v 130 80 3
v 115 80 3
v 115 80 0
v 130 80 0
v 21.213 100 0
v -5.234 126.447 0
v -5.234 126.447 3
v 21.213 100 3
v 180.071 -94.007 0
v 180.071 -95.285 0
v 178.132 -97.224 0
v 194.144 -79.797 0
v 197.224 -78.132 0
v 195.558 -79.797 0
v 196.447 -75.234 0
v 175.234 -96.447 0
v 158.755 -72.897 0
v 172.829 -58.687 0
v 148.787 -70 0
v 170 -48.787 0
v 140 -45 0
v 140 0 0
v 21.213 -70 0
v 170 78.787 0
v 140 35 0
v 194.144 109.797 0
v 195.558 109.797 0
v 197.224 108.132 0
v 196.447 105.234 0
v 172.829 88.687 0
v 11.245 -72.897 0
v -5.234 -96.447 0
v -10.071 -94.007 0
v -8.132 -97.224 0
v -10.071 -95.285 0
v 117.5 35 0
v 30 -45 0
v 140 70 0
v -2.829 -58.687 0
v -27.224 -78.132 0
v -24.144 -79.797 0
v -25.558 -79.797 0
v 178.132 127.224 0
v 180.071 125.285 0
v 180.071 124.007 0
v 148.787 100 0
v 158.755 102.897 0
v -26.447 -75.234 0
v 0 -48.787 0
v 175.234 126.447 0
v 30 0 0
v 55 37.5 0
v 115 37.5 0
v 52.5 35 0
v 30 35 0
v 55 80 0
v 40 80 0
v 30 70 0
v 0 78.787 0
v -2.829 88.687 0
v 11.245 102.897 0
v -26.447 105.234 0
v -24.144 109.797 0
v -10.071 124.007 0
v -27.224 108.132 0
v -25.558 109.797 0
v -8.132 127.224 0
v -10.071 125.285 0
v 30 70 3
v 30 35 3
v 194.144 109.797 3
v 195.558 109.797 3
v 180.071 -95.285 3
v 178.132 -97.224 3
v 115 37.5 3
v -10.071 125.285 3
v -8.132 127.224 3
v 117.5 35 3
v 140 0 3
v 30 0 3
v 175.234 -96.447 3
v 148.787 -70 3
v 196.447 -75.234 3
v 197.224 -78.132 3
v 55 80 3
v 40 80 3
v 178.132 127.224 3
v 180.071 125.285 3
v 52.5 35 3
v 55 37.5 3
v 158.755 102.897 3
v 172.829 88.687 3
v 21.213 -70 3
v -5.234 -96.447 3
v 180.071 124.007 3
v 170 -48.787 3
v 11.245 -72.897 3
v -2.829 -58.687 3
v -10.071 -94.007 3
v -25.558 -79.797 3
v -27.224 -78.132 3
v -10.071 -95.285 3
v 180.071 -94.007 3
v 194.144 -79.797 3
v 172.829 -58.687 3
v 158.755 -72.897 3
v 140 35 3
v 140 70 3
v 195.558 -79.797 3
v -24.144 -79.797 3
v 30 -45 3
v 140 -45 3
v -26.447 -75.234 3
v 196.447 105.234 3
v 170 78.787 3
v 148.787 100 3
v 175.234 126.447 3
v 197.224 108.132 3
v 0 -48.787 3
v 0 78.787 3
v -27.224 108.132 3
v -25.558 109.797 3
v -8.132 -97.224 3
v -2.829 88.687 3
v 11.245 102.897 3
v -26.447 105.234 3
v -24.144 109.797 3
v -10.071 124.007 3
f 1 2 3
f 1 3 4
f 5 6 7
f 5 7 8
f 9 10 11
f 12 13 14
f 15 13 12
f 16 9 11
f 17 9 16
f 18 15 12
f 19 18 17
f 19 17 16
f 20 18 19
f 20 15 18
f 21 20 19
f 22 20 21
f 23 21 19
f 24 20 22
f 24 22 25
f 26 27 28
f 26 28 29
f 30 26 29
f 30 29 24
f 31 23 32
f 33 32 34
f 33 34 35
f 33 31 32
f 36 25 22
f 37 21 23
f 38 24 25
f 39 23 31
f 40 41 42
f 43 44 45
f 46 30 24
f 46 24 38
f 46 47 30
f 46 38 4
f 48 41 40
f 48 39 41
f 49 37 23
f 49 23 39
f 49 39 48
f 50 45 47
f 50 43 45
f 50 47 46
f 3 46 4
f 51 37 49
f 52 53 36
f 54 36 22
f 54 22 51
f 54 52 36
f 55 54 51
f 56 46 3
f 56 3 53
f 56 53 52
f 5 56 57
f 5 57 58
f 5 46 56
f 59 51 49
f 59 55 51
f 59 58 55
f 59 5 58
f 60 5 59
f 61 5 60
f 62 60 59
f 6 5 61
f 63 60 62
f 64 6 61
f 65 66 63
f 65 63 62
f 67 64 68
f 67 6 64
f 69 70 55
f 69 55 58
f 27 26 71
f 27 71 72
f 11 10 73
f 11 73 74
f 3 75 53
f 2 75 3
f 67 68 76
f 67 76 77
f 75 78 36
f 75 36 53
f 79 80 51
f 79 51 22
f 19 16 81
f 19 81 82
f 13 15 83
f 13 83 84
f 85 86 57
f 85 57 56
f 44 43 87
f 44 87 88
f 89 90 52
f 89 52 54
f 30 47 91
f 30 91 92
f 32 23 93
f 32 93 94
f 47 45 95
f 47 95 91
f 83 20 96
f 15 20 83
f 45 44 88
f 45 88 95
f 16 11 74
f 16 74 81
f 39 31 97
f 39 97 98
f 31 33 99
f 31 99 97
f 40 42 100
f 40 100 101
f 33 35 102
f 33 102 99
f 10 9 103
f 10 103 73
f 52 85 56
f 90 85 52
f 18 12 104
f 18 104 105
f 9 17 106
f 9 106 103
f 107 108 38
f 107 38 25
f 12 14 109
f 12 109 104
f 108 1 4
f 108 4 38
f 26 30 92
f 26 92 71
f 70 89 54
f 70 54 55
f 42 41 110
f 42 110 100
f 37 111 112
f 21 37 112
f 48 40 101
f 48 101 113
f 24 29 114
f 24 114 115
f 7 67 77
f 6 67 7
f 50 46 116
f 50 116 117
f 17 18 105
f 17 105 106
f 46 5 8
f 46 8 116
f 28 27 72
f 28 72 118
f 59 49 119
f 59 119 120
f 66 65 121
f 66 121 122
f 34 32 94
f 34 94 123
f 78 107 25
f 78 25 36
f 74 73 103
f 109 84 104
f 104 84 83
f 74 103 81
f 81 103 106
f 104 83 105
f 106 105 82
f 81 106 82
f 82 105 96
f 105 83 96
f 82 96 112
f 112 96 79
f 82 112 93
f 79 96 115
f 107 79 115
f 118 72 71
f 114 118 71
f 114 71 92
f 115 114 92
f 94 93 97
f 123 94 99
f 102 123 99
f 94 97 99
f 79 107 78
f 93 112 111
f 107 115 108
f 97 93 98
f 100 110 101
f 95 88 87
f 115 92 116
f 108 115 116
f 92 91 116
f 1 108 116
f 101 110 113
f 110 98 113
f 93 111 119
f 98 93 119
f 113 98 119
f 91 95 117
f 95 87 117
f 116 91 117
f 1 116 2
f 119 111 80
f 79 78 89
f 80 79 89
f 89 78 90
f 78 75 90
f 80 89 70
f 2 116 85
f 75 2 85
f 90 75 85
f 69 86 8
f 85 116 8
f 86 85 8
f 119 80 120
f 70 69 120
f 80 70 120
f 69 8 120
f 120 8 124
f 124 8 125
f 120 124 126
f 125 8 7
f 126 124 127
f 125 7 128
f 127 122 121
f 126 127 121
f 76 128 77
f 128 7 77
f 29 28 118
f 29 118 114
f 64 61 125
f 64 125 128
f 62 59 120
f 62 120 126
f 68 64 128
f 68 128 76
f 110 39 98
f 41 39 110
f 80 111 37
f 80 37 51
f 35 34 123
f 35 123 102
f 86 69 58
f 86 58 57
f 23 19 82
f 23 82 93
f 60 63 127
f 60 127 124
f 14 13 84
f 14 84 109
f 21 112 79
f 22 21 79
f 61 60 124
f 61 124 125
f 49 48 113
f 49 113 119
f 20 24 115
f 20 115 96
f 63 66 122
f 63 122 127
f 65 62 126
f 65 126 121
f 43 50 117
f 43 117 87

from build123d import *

# Parameters (mm, degrees)
BOSS_EXTRUDE1_DEPTH = 3
SKETCH2_W           = 109.999996871
SKETCH2_H           = 44.999998436
CUT_EXTRUDE1_DEPTH  = 10


with BuildPart() as part:
    # Sketch1 → Boss-Extrude1 (new body)
    with BuildSketch(Plane.XY):
        Polygon((158.754970941, -72.897106565), (180.070576123, -94.00741153), (180.070576123, -95.284756679), (178.131724855, -97.223607947), (175.233947376, -96.447150811), (148.786793436, -69.999996871), (21.213203436, -69.999996871), (-5.233950505, -96.447150811), (-8.131727984, -97.223607947), (-10.070579252, -95.284756679), (-10.070579252, -94.00741153), (11.24502593, -72.897106565), (-2.828675487, -58.686536734), (-24.144280669, -79.796841699), (-25.558494231, -79.796841699), (-27.223611076, -78.131724855), (-26.44715394, -75.233947376), (0, -48.786793435), (0, 78.786796565), (-26.44715394, 105.233950505), (-27.223611076, 108.131727984), (-25.558494231, 109.796844828), (-24.144280669, 109.796844828), (-2.828675487, 88.686539863), (11.24502593, 102.897109694), (-10.070579252, 124.007414659), (-10.070579252, 125.284759808), (-8.131727984, 127.223611076), (-5.233950505, 126.447153941), (21.213203436, 100), (148.786793436, 100), (175.233947376, 126.447153941), (178.131724855, 127.223611076), (180.070576123, 125.284759808), (180.070576123, 124.007414659), (158.754970941, 102.897109694), (172.828672358, 88.686539863), (194.14427754, 109.796844828), (195.558491102, 109.796844828), (197.223607947, 108.131727984), (196.447150812, 105.233950505), (169.999996871, 78.786796565), (169.999996871, -48.786793435), (196.447150812, -75.233947376), (197.223607947, -78.131724855), (195.558491102, -79.796841699), (194.14427754, -79.796841699), (172.828672358, -58.686536734), align=None)
    extrude(amount=BOSS_EXTRUDE1_DEPTH)

    # Sketch2 → Cut-Extrude1 (cut)
    with BuildSketch(Plane.XY.offset(3)):
        Polygon((30, 70), (40, 80), (54.999998436, 80), (54.999998436, 37.500001565), (52.499998436, 35.000001565), (30, 35.000001565), align=None)
        Polygon((139.999996871, 35.000001565), (117.499998436, 35.000001565), (114.999998436, 37.500001565), (114.999998436, 80), (129.999996871, 80), (139.999996871, 70), align=None)
        with Locations((84.999998436, -22.499997653)):
            Rectangle(SKETCH2_W, SKETCH2_H)
    extrude(amount=-CUT_EXTRUDE1_DEPTH, mode=Mode.SUBTRACT)


solid = part.part
